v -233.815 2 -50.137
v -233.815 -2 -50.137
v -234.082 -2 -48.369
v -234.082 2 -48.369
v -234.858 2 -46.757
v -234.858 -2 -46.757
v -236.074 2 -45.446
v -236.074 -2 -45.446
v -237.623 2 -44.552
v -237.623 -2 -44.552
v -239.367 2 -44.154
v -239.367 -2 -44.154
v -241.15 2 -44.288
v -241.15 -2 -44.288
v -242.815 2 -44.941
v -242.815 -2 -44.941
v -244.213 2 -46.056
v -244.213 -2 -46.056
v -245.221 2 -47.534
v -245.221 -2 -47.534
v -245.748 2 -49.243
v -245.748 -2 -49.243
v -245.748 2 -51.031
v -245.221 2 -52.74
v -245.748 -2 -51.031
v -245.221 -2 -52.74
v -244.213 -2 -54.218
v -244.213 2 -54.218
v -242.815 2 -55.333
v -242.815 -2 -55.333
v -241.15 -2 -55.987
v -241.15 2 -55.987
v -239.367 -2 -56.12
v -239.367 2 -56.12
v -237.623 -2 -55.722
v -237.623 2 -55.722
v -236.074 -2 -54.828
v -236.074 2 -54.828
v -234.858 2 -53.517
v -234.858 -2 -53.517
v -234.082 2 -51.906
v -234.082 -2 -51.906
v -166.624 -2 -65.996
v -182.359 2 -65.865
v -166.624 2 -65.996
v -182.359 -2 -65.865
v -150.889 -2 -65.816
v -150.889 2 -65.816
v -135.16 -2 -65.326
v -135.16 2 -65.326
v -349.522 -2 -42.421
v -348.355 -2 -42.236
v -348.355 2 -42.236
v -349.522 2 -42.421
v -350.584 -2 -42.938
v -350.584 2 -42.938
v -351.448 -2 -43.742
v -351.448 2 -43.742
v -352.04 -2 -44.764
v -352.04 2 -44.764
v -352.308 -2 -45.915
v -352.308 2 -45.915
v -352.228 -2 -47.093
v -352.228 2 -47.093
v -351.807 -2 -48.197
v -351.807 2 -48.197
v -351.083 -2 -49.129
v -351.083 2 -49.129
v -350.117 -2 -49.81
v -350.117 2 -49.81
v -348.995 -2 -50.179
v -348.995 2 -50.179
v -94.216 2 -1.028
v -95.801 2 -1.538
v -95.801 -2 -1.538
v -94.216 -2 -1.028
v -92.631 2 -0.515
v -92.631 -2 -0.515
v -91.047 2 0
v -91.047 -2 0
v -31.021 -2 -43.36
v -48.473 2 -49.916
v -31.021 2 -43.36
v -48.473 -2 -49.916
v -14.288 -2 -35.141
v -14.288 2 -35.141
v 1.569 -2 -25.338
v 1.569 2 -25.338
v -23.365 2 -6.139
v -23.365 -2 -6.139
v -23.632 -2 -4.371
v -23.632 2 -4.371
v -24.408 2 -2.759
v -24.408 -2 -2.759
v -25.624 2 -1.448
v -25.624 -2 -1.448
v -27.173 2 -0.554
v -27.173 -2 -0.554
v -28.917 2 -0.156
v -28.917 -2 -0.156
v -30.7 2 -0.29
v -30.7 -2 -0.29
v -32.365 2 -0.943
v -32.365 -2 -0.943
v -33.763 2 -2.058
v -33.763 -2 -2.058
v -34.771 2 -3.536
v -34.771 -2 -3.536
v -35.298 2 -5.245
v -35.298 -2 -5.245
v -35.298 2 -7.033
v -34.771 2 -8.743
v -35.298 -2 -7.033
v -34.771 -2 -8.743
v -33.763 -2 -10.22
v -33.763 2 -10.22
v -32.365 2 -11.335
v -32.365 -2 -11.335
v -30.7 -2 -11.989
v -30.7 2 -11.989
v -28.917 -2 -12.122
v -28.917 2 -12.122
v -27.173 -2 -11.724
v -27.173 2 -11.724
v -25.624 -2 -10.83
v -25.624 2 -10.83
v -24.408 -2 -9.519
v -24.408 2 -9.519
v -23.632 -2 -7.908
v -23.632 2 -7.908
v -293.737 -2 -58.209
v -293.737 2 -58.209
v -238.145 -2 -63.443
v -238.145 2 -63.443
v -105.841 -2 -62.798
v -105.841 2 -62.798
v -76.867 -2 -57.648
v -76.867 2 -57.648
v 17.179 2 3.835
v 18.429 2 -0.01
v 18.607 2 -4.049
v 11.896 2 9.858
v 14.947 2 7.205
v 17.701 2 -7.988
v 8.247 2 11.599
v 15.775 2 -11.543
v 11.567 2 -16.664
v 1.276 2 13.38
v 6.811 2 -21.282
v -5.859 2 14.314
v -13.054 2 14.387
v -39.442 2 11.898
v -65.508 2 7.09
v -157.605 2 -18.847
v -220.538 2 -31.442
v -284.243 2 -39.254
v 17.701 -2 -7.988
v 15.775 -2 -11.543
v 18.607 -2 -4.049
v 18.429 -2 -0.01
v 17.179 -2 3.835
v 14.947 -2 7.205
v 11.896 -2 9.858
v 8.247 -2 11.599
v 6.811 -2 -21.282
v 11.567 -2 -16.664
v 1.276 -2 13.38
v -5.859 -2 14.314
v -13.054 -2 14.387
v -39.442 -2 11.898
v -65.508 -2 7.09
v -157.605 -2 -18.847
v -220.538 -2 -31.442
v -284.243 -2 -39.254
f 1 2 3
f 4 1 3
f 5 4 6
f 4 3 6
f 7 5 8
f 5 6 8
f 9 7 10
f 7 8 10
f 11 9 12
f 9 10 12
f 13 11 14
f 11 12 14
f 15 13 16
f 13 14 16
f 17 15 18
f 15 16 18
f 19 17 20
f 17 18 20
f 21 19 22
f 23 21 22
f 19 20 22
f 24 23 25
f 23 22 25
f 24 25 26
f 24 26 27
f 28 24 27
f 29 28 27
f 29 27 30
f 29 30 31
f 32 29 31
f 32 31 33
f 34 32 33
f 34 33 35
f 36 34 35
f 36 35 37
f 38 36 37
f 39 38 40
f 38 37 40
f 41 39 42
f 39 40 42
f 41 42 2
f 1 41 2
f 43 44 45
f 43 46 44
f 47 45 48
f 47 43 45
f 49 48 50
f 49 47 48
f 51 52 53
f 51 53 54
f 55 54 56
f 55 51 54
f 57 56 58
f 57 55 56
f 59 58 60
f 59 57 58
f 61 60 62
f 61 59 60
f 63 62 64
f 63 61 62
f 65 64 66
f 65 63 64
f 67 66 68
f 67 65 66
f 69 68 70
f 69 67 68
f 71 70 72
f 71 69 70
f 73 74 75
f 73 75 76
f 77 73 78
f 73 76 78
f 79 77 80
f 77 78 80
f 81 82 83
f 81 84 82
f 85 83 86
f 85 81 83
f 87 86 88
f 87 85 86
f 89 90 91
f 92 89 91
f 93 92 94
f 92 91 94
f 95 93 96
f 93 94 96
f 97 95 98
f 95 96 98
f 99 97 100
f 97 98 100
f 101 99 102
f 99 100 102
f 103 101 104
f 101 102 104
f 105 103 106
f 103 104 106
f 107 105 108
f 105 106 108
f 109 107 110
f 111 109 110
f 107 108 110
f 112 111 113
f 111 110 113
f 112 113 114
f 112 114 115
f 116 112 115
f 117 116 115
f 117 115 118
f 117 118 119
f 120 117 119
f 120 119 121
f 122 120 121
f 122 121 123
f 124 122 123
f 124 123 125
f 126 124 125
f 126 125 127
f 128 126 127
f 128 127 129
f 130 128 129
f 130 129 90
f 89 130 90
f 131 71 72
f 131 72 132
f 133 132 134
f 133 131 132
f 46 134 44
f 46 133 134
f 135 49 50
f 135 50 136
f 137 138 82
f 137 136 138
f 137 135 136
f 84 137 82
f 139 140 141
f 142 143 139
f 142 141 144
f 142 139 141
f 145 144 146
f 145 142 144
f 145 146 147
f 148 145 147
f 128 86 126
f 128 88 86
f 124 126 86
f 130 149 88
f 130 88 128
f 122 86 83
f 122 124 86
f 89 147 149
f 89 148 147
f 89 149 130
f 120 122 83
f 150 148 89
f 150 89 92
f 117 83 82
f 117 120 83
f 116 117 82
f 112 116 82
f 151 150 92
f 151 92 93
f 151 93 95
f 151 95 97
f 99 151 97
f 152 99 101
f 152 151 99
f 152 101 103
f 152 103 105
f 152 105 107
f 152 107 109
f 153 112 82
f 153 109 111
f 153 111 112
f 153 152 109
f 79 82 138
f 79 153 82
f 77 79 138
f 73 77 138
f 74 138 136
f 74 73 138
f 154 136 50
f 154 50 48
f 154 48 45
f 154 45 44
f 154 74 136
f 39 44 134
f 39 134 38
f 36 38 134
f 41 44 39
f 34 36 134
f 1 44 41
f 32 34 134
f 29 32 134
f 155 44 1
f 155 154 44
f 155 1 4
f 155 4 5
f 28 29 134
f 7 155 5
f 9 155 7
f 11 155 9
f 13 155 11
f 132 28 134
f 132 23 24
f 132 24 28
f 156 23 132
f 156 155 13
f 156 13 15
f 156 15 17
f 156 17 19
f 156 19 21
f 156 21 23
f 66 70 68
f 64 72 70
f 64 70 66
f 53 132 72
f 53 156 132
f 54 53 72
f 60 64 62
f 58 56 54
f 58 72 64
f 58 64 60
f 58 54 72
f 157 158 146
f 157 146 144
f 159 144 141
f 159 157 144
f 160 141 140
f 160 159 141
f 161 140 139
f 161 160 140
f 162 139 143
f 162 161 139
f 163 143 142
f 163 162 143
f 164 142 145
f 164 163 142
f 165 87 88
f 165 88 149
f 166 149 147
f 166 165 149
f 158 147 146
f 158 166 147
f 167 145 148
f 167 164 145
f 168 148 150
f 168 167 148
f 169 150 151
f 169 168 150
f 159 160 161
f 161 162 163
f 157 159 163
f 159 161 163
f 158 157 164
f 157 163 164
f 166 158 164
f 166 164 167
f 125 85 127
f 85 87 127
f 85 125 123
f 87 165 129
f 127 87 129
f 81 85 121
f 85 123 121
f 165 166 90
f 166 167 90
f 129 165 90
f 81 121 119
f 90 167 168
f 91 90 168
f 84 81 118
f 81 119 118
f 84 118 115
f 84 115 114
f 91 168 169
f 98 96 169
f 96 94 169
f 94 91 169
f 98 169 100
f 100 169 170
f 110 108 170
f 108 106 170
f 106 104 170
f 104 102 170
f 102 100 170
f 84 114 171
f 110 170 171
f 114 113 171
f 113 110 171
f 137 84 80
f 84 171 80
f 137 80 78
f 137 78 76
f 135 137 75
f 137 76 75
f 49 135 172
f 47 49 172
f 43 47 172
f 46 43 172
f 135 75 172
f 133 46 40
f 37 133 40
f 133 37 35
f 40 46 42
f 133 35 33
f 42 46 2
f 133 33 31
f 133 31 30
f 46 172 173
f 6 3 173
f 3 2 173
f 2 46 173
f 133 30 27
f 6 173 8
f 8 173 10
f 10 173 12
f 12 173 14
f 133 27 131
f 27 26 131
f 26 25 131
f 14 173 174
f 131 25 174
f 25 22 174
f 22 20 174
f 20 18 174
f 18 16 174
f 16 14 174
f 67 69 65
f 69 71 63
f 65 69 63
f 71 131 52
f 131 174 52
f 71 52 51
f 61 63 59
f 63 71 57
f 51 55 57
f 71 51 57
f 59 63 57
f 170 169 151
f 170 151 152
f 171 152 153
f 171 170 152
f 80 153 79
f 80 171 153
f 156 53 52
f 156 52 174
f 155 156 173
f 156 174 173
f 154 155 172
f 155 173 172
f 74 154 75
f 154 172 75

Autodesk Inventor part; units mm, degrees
ref_plane "YZ Plane" through (0, 0, 0) normal (1, 0, 0) x (0, 1, 0)
ref_plane "XZ Plane" through (0, 0, 0) normal (0, 1, 0) x (-1, 0, 0)
ref_plane "XY Plane" through (0, 0, 0) normal (0, 0, 1) x (1, 0, 0)
sketch "スケッチ1" plane through (0, 0, 0) normal (0, 1, 0) x (-1, 0, 0)
  arc A0 (348.9954, -50.1786) -> (348.3553, -42.2361) centre (348.3204, -46.2359) ccw projected
  arc A1 (182.359, -65.8653) -> (348.9954, -50.1786) centre (162.2533, 1040.6287) ccw projected
  arc A2 (135.1603, -65.3257) -> (182.359, -65.8653) centre (167.871, 731.467) ccw projected
  arc A3 (48.4731, -49.9165) -> (135.1603, -65.3257) centre (148.588, 261.756) ccw projected
  arc A4 (-1.5687, -25.3375) -> (48.4731, -49.9165) centre (107.173, 132.825) ccw projected
  arc A5 (-15.7749, -11.5429) -> (-1.5687, -25.3375) centre (31.9, 23.342) ccw projected
  arc A6 (-8.2474, 11.5993) -> (-15.7749, -11.5429) centre (-3.6695, -2.6851) ccw projected
  arc A7 (13.0537, 14.3873) -> (-8.2474, 11.5993) centre (10.0641, -45.5382) ccw projected
  arc A8 (91.047, 0) -> (13.0537, 14.3873) centre (-1.8944, -285.2401) ccw projected
  arc A9 (91.047, 0) -> (95.8009, -1.5381) centre (462.8125, 1140.9603) ccw projected
  arc A10 (95.8009, -1.5381) -> (348.3553, -42.2361) centre (355.7675, 807.7316) ccw projected
  point P0 (0, 0)
extrude "押し出し1" add sketch "スケッチ1" along normal mid plane 4
sketch "スケッチ2" plane through (0, -2, 0) normal (0, -1, 0) x (1, 0, 0)
  line L0 (0, 0) -> (-283.8627, -59.346)
  arc A0 (-348.9954, -50.1786) -> (-182.359, -65.8653) centre (-162.2533, 1040.6287) ccw projected
  circle A1 centre (-29.3651, -6.1392) radius 6
  circle A2 centre (-239.8151, -50.1371) radius 6
  dimension "d3" = 290
  dimension "d4" = 12
  dimension "d5" = 12
  dimension "d6" = 30
  dimension "d7" = 215
extrude "押し出し2" cut sketch "スケッチ2" against normal through all
properties part number "flap_m"
